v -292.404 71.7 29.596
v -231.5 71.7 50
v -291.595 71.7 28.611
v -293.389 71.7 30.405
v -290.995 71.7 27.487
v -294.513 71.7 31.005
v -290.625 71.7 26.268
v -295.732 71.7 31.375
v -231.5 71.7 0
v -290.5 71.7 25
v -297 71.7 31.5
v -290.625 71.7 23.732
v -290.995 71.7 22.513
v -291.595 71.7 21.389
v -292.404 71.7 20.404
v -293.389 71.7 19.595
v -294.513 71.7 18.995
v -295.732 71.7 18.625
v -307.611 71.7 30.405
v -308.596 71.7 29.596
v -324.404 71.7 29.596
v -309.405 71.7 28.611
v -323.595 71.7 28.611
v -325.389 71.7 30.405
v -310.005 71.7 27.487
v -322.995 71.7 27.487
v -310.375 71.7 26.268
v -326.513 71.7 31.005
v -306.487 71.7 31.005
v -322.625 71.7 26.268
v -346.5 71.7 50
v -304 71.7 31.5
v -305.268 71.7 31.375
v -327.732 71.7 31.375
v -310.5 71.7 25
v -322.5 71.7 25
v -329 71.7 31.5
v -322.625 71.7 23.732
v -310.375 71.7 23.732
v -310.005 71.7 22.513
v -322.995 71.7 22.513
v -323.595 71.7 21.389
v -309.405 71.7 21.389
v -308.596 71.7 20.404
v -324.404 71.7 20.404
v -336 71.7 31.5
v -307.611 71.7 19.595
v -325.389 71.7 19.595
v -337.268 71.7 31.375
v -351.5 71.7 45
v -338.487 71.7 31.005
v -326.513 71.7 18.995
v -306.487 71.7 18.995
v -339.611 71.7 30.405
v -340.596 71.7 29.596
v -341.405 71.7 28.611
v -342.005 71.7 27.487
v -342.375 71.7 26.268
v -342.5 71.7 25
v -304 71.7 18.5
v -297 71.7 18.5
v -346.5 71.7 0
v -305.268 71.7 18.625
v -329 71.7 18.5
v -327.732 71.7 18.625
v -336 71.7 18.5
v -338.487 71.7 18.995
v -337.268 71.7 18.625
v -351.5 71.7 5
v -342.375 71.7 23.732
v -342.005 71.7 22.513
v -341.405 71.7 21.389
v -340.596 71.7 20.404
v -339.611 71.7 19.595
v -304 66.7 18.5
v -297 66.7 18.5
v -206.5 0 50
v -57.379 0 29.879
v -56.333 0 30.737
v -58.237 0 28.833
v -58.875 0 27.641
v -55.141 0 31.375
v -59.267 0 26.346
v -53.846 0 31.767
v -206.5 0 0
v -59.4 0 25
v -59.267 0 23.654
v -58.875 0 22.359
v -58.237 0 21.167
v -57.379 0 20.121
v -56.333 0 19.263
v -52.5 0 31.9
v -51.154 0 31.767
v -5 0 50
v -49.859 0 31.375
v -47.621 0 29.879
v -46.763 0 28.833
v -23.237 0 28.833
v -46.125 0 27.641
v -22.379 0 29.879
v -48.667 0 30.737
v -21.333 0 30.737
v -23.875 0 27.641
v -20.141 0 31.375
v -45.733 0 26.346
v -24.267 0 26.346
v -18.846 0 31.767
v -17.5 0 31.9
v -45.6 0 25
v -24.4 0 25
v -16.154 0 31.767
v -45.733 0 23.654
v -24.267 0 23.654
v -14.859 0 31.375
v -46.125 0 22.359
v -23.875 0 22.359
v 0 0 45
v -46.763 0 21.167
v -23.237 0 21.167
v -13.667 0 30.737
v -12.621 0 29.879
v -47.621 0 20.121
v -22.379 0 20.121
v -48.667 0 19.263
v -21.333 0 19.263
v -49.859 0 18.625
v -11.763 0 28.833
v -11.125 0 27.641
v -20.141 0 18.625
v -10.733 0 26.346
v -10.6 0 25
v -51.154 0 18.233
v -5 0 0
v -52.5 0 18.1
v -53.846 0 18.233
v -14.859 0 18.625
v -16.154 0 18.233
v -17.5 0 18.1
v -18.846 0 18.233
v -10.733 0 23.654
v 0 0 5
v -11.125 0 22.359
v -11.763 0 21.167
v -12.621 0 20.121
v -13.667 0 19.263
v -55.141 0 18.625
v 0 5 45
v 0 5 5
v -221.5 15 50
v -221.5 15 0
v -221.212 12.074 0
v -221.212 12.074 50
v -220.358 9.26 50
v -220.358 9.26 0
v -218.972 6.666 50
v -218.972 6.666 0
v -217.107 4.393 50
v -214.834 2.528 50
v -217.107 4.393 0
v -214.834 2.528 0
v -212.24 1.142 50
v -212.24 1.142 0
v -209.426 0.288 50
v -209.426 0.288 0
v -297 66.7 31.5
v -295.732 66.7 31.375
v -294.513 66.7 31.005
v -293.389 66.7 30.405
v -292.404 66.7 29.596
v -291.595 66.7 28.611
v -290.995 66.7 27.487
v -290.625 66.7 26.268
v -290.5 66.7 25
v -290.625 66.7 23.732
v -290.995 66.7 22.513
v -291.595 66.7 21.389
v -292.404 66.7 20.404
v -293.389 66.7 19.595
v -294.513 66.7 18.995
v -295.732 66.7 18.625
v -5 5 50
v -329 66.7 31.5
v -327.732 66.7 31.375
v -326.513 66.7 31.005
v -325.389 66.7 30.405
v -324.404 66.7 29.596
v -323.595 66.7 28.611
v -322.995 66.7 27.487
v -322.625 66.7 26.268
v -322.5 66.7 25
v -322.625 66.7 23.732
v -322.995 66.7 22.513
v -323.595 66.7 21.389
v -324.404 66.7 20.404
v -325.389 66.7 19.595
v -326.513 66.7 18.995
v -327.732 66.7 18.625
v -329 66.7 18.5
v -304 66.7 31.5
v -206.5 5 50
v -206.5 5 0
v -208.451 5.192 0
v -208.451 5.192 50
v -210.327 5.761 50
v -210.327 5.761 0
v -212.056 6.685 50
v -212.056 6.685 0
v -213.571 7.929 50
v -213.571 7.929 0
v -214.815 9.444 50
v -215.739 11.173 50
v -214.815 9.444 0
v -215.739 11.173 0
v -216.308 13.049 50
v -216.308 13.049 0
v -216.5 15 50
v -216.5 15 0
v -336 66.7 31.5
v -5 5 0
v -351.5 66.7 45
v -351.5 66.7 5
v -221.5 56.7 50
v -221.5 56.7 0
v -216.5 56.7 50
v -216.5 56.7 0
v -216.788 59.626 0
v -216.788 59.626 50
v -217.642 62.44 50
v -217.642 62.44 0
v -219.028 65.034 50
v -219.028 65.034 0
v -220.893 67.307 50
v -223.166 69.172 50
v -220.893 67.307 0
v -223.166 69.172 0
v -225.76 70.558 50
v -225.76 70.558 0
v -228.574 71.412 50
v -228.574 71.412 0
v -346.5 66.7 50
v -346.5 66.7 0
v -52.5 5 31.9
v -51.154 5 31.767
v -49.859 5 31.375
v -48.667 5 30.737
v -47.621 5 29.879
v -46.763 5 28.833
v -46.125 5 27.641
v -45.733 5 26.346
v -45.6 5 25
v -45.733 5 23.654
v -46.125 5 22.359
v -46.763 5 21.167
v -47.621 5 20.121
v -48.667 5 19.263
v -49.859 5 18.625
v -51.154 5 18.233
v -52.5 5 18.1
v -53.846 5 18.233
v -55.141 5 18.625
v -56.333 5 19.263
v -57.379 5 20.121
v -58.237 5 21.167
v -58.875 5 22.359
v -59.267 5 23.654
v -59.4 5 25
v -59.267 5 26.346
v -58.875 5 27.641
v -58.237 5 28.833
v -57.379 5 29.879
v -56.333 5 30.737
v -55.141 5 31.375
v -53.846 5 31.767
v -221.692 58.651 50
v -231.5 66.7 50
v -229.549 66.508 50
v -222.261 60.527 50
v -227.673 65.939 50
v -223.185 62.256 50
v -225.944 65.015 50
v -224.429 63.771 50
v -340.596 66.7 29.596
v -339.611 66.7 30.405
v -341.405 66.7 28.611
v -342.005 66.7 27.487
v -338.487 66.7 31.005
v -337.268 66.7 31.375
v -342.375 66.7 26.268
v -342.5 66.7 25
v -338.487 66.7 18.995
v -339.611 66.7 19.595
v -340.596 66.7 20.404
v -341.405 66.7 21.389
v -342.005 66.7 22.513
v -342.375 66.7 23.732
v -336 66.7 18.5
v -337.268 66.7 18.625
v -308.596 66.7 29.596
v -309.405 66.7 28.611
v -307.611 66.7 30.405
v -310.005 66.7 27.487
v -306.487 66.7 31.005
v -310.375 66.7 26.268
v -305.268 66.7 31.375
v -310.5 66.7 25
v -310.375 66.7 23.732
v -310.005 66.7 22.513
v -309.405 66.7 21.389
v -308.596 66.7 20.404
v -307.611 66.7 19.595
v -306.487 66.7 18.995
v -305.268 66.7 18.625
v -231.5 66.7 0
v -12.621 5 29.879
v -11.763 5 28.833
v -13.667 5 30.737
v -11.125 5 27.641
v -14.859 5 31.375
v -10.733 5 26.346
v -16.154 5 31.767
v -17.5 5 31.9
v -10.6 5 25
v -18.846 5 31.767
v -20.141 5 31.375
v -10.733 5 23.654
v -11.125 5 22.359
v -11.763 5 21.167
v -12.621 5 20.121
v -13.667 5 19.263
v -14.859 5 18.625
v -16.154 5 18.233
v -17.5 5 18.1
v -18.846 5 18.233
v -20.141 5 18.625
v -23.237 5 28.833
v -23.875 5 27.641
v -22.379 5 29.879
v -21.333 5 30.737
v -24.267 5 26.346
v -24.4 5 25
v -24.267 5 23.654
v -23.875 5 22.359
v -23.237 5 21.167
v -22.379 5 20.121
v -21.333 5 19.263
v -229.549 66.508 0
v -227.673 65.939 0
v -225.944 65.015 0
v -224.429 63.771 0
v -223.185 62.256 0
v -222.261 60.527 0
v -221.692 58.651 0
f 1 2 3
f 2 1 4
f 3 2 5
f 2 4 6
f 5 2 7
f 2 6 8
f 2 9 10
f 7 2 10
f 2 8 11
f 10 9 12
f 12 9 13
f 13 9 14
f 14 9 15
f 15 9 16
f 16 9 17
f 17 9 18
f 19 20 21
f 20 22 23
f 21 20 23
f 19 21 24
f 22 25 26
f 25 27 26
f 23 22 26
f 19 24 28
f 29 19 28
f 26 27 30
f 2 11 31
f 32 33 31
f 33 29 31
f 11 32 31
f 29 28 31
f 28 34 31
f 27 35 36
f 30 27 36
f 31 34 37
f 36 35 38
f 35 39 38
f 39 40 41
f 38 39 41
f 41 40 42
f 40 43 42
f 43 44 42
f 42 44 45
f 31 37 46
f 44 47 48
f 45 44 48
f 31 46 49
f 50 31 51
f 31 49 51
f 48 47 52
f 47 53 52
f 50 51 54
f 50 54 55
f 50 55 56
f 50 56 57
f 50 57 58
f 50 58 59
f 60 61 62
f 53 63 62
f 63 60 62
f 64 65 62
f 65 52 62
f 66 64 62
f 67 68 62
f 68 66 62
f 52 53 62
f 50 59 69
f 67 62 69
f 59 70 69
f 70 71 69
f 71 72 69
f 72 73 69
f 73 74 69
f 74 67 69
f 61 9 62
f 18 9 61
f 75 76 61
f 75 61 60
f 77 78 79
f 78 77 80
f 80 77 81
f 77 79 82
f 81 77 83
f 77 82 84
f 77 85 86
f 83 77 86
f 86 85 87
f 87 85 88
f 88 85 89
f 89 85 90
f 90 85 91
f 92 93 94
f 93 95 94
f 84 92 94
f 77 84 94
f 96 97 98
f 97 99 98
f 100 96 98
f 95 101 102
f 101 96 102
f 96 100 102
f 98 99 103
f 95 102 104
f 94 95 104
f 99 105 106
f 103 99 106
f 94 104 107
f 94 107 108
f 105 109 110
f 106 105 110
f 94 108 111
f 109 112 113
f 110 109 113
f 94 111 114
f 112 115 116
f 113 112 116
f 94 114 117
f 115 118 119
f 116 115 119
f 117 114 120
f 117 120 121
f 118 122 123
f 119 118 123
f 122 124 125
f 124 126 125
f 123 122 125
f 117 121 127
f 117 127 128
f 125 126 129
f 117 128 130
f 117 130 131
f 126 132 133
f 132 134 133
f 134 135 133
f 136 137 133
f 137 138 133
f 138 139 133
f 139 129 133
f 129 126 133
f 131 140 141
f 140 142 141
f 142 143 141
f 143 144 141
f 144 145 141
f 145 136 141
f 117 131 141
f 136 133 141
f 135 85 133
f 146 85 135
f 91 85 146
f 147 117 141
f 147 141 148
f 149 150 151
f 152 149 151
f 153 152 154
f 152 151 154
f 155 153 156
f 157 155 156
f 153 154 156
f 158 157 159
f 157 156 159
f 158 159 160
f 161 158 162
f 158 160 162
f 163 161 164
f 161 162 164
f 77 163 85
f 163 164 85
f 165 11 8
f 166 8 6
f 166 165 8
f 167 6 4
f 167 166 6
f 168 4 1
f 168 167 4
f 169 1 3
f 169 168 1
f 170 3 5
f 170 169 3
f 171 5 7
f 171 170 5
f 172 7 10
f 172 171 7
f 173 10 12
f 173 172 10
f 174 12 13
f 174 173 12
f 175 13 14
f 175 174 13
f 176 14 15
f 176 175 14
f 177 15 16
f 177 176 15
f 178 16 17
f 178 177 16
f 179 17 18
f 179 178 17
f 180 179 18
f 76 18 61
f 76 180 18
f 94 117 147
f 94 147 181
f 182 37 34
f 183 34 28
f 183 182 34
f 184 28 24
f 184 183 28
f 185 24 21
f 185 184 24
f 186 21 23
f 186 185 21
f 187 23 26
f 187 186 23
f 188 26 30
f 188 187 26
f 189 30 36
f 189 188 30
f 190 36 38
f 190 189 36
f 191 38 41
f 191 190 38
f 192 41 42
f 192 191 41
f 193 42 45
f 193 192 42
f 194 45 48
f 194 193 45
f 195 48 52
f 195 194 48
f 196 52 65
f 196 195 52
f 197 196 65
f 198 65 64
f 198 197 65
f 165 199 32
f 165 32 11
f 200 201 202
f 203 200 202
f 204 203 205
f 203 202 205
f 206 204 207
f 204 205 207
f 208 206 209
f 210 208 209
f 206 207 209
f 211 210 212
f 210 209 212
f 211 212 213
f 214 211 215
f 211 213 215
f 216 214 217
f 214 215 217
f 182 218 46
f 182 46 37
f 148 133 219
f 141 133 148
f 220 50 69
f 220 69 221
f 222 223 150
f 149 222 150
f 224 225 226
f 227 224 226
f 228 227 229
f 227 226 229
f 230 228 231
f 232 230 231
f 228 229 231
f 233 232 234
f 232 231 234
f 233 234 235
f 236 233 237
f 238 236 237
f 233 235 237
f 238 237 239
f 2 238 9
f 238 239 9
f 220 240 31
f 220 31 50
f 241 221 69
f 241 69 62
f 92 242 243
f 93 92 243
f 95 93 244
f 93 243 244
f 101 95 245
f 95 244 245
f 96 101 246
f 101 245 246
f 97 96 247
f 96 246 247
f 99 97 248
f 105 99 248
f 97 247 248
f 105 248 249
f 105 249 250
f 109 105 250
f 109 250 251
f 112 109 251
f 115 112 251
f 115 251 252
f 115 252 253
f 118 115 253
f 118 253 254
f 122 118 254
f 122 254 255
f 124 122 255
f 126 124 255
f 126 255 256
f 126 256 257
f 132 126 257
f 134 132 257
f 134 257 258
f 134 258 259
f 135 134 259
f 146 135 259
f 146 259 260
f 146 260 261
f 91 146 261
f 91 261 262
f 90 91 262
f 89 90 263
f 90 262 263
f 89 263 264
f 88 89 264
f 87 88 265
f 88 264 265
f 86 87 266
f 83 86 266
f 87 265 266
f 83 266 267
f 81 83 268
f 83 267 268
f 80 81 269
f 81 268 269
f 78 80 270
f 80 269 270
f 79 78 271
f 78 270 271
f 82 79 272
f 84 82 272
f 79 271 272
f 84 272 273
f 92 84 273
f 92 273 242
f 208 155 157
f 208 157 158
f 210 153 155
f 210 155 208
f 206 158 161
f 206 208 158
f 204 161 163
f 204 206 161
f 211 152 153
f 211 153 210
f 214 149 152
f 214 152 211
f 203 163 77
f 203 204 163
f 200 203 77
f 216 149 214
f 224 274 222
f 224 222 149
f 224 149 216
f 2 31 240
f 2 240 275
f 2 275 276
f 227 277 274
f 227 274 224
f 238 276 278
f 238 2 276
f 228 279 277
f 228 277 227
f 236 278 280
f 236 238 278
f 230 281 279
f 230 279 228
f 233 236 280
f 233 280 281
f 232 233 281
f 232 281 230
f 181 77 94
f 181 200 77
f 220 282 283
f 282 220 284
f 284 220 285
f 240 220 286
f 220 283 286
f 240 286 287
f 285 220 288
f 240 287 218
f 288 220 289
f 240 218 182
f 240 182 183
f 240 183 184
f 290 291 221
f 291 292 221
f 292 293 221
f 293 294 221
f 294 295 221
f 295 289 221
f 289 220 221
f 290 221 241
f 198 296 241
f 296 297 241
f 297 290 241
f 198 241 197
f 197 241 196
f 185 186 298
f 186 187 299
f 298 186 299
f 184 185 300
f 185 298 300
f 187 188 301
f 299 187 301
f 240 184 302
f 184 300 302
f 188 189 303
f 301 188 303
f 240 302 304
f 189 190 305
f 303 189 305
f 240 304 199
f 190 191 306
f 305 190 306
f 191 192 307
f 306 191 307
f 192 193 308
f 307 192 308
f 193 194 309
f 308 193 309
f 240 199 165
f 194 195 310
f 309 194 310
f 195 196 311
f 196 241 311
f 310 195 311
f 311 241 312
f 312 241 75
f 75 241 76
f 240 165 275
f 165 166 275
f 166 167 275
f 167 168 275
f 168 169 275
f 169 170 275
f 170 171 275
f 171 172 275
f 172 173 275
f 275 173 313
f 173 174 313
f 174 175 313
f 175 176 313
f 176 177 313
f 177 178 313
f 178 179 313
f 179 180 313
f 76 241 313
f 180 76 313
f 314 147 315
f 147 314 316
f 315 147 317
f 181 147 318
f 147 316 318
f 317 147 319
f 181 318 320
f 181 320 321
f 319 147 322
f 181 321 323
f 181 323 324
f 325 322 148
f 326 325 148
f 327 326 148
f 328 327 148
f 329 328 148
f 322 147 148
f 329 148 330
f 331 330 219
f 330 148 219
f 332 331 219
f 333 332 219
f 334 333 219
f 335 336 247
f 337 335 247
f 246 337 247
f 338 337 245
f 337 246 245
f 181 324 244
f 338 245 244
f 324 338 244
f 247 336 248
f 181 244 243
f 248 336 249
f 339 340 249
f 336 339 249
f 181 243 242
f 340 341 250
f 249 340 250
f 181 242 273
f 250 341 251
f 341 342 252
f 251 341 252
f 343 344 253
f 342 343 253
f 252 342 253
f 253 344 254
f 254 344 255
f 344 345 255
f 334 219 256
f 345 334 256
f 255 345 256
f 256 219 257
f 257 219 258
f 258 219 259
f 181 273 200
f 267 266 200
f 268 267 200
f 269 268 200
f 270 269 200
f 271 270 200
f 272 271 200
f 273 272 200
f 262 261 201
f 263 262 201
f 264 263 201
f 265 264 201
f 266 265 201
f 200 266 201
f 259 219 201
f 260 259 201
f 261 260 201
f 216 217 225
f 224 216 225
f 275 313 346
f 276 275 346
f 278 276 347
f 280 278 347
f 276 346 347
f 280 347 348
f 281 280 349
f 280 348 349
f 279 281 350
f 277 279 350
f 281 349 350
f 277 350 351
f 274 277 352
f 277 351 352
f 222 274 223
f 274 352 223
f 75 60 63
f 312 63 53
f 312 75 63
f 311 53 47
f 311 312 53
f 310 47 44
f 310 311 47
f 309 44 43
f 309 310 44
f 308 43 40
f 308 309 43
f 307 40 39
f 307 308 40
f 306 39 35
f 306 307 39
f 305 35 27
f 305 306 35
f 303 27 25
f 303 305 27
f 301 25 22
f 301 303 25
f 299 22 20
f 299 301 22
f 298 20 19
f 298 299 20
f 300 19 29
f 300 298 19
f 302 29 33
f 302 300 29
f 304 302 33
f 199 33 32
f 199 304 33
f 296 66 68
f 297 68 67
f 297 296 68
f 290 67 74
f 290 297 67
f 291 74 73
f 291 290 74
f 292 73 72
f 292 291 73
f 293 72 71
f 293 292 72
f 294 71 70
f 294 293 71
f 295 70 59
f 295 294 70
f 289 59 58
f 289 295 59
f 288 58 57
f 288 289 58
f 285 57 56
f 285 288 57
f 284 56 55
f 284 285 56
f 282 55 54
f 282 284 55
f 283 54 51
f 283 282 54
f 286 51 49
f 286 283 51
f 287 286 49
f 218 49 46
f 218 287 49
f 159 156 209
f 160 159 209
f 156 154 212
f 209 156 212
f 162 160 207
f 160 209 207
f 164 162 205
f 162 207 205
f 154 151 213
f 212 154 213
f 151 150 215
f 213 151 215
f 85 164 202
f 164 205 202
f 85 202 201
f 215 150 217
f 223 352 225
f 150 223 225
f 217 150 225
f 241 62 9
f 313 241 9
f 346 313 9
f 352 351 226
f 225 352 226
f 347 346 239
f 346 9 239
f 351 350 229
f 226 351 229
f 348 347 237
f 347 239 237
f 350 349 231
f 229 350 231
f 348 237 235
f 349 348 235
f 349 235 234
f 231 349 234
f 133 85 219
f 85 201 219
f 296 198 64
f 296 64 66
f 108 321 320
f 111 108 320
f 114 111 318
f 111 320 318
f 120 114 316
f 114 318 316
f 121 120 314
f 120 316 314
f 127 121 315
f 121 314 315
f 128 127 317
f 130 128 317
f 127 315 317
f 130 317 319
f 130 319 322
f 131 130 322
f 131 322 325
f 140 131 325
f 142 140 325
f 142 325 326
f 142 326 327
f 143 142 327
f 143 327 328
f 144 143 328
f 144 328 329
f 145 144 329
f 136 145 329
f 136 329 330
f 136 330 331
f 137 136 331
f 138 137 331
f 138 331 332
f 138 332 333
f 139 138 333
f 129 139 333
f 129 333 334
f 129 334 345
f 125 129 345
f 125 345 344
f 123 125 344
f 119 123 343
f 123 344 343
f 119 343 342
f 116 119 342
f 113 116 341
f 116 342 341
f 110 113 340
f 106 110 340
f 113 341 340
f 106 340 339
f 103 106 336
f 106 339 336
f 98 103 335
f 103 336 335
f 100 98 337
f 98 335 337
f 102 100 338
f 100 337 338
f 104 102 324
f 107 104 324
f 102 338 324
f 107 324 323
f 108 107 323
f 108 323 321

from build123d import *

# Parameters (mm, degrees)
SM_BASE_FLANGE_1_DEPTH = 50
SKETCH_3_R             = 6.9
CUT_EXTRUDE_2_DEPTH    = 10
OTHER_1_DEPTH          = 71.7
CUT_EXTRUDE_3_DEPTH    = 10


# Read off the part's stored shape, not the designer's step: Затупленный угол1
# Sheet-metal steps are written as plain solids
with BuildPart() as part:
    # Sketch 1 → Базовая кромка1 (new body)
    with BuildSketch(Plane.XY):
        with BuildLine():
            Line((-351.5, 66.7), (-231.5, 66.7))
            ThreePointArc((-231.5, 66.7), (-224.428932188, 63.771067812), (-221.5, 56.7))
            Line((-221.5, 56.7), (-221.5, 15))
            ThreePointArc((-221.5, 15), (-217.106601718, 4.393398282), (-206.5, 0))
            Line((-206.5, 0), (0, 0))
            Line((0, 0), (0, 5))
            Line((0, 5), (-206.5, 5))
            ThreePointArc((-206.5, 5), (-213.571067812, 7.928932188), (-216.5, 15))
            Line((-216.5, 15), (-216.5, 56.7))
            ThreePointArc((-216.5, 56.7), (-220.893398282, 67.306601718), (-231.5, 71.7))
            Line((-231.5, 71.7), (-351.5, 71.7))
            Line((-351.5, 71.7), (-351.5, 66.7))
        make_face()
    extrude(amount=SM_BASE_FLANGE_1_DEPTH)

    # Эскиз3 → Вырез-Вытянуть2 (cut)
    with BuildSketch(Plane(origin=(0, 5, 0), x_dir=(1, 0, 0), z_dir=(0, 1, 0))):
        with Locations(Location((-17.5, -25, 0), (0, 0, 270))):
            Circle(SKETCH_3_R)
        with Locations(Location((-52.5, -25, 0), (0, 0, 270))):
            Circle(SKETCH_3_R)
    extrude(amount=-CUT_EXTRUDE_2_DEPTH, mode=Mode.SUBTRACT)

    # Other 1 outline → Other 1 (cut)
    with BuildSketch(Plane(origin=(0, 0, 0), x_dir=(1, 0, 0), z_dir=(0, 1, 0))):
        Polygon((0, 0), (-5, 0), (0, -5), align=None)
        Polygon((0, -50), (0, -45), (-5, -50), align=None)
        Polygon((-346.5, -50), (-351.5, -45), (-351.5, -50), align=None)
        Polygon((-351.5, -5), (-346.5, 0), (-351.5, 0), align=None)
    extrude(amount=OTHER_1_DEPTH, mode=Mode.SUBTRACT)

    # Эскиз4 → Вырез-Вытянуть3 (cut)
    with BuildSketch(Plane.XZ.offset(-66.7)):
        with BuildLine():
            Line((-329, 18.5), (-336, 18.5))
            ThreePointArc((-336, 18.5), (-342.5, 25), (-336, 31.5))
            Line((-336, 31.5), (-329, 31.5))
            ThreePointArc((-329, 31.5), (-322.5, 25), (-329, 18.5))
        make_face()
        with BuildLine():
            Line((-297, 18.5), (-304, 18.5))
            ThreePointArc((-304, 18.5), (-310.5, 25), (-304, 31.5))
            Line((-304, 31.5), (-297, 31.5))
            ThreePointArc((-297, 31.5), (-290.5, 25), (-297, 18.5))
        make_face()
    extrude(amount=-CUT_EXTRUDE_3_DEPTH, mode=Mode.SUBTRACT)


solid = part.part
